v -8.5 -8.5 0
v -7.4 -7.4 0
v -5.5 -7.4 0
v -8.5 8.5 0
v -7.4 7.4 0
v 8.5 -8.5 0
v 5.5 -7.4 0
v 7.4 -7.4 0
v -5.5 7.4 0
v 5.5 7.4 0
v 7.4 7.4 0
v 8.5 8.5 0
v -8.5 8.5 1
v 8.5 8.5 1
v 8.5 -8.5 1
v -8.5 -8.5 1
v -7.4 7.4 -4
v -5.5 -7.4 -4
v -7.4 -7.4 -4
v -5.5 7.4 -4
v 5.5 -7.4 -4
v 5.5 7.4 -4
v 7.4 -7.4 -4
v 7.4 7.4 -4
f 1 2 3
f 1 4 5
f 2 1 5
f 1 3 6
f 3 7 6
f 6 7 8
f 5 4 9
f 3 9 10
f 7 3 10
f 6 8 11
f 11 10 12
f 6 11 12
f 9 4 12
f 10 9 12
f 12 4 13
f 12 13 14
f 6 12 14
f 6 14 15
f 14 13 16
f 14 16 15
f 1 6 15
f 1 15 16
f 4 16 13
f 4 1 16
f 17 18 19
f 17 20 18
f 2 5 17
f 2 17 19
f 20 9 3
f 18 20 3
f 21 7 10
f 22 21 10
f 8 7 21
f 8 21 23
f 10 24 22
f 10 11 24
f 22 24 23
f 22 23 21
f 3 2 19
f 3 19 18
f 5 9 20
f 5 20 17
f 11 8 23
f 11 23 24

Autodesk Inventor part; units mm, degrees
ref_plane "YZ Plane" through (0, 0, 0) normal (1, 0, 0) x (0, 1, 0)
ref_plane "XZ Plane" through (0, 0, 0) normal (0, 1, 0) x (-1, 0, 0)
ref_plane "XY Plane" through (0, 0, 0) normal (0, 0, 1) x (1, 0, 0)
sketch "Sketch1" plane through (0, 0, 0) normal (0, 0, 1) x (1, 0, 0)
  line L0 (7.5, 7.5) -> (-7.5, 7.5) projected
  line L1 (7.5, 7.5) -> (-7.5, 7.5) projected
  line L2 (-7.5, 7.5) -> (-7.5, -7.5) projected
  line L3 (-7.5, -7.5) -> (7.5, -7.5) projected
  line L4 (7.5, -7.5) -> (7.5, 7.5) projected
  line L5 (-8.5, 8.5) -> (8.5, 8.5) projected
  line L6 (8.5, 8.5) -> (8.5, -8.5) projected
  line L7 (8.5, -8.5) -> (-8.5, -8.5) projected
  line L8 (-8.5, -8.5) -> (-8.5, 8.5) projected
  point P0 (0, 0)
extrude "Extrusion1" add sketch "Sketch1" along normal blind 1 contours L4 L3 L2 L0 | L5 L6 L7 L8
sketch "Sketch2" plane through (0, 0, 0) normal (0, 0, -1) x (-1, 0, 0)
  line L0 (-7.5, 7.5) -> (7.5, 7.5) projected
  line L1 (7.5, 7.5) -> (7.5, -7.5) projected
  line L2 (7.5, -7.5) -> (-7.5, -7.5) projected
  line L3 (-7.5, -7.5) -> (-7.5, 7.5) projected
  line L4 (8.5, 8.5) -> (-8.5, 8.5) projected
  line L5 (-8.5, 8.5) -> (-8.5, -8.5) projected
  line L6 (-8.5, -8.5) -> (8.5, -8.5) projected
  line L7 (8.5, -8.5) -> (8.5, 8.5) projected
  line L8 (-7.5, -7.5) -> (-5.5, -7.5)
  line L9 (-5.5, -7.5) -> (-5.5, 7.5)
  line L10 (-5.5, 7.5) -> (-7.5, 7.5)
  line L11 (-7.5, 7.5) -> (-7.5, -7.5)
  line L12 (7.5, 7.5) -> (5.5, 7.5)
  line L13 (5.5, 7.5) -> (5.5, -7.5)
  line L14 (5.5, -7.5) -> (7.5, -7.5)
  line L15 (7.5, -7.5) -> (7.5, 7.5)
  point P0 (0, 0)
  dimension "d2" = 2
  dimension "d3" = 2
extrude "Extrusion2" add sketch "Sketch2" along normal blind 4 contours L0 L9 L2 L3 | L0 L1 L2 L13
thicken "Thicken1" operation add thickness 0.1 both sides no extend neighbours yes toward (0, -1, 0) faces at (6.1667, 7.5, -1.3333) (7.5, 2.5, -1.3333) (6.8333, -7.5, -1.3333)
thicken "Thicken2" operation add thickness 0.1 both sides no extend neighbours yes toward (0, 1, 0) faces at (-6.1667, -7.5, -1.3333) (-7.5, -2.5, -1.3333) (-6.8333, 7.5, -1.3333)
properties part number "hull_cover_cover"
